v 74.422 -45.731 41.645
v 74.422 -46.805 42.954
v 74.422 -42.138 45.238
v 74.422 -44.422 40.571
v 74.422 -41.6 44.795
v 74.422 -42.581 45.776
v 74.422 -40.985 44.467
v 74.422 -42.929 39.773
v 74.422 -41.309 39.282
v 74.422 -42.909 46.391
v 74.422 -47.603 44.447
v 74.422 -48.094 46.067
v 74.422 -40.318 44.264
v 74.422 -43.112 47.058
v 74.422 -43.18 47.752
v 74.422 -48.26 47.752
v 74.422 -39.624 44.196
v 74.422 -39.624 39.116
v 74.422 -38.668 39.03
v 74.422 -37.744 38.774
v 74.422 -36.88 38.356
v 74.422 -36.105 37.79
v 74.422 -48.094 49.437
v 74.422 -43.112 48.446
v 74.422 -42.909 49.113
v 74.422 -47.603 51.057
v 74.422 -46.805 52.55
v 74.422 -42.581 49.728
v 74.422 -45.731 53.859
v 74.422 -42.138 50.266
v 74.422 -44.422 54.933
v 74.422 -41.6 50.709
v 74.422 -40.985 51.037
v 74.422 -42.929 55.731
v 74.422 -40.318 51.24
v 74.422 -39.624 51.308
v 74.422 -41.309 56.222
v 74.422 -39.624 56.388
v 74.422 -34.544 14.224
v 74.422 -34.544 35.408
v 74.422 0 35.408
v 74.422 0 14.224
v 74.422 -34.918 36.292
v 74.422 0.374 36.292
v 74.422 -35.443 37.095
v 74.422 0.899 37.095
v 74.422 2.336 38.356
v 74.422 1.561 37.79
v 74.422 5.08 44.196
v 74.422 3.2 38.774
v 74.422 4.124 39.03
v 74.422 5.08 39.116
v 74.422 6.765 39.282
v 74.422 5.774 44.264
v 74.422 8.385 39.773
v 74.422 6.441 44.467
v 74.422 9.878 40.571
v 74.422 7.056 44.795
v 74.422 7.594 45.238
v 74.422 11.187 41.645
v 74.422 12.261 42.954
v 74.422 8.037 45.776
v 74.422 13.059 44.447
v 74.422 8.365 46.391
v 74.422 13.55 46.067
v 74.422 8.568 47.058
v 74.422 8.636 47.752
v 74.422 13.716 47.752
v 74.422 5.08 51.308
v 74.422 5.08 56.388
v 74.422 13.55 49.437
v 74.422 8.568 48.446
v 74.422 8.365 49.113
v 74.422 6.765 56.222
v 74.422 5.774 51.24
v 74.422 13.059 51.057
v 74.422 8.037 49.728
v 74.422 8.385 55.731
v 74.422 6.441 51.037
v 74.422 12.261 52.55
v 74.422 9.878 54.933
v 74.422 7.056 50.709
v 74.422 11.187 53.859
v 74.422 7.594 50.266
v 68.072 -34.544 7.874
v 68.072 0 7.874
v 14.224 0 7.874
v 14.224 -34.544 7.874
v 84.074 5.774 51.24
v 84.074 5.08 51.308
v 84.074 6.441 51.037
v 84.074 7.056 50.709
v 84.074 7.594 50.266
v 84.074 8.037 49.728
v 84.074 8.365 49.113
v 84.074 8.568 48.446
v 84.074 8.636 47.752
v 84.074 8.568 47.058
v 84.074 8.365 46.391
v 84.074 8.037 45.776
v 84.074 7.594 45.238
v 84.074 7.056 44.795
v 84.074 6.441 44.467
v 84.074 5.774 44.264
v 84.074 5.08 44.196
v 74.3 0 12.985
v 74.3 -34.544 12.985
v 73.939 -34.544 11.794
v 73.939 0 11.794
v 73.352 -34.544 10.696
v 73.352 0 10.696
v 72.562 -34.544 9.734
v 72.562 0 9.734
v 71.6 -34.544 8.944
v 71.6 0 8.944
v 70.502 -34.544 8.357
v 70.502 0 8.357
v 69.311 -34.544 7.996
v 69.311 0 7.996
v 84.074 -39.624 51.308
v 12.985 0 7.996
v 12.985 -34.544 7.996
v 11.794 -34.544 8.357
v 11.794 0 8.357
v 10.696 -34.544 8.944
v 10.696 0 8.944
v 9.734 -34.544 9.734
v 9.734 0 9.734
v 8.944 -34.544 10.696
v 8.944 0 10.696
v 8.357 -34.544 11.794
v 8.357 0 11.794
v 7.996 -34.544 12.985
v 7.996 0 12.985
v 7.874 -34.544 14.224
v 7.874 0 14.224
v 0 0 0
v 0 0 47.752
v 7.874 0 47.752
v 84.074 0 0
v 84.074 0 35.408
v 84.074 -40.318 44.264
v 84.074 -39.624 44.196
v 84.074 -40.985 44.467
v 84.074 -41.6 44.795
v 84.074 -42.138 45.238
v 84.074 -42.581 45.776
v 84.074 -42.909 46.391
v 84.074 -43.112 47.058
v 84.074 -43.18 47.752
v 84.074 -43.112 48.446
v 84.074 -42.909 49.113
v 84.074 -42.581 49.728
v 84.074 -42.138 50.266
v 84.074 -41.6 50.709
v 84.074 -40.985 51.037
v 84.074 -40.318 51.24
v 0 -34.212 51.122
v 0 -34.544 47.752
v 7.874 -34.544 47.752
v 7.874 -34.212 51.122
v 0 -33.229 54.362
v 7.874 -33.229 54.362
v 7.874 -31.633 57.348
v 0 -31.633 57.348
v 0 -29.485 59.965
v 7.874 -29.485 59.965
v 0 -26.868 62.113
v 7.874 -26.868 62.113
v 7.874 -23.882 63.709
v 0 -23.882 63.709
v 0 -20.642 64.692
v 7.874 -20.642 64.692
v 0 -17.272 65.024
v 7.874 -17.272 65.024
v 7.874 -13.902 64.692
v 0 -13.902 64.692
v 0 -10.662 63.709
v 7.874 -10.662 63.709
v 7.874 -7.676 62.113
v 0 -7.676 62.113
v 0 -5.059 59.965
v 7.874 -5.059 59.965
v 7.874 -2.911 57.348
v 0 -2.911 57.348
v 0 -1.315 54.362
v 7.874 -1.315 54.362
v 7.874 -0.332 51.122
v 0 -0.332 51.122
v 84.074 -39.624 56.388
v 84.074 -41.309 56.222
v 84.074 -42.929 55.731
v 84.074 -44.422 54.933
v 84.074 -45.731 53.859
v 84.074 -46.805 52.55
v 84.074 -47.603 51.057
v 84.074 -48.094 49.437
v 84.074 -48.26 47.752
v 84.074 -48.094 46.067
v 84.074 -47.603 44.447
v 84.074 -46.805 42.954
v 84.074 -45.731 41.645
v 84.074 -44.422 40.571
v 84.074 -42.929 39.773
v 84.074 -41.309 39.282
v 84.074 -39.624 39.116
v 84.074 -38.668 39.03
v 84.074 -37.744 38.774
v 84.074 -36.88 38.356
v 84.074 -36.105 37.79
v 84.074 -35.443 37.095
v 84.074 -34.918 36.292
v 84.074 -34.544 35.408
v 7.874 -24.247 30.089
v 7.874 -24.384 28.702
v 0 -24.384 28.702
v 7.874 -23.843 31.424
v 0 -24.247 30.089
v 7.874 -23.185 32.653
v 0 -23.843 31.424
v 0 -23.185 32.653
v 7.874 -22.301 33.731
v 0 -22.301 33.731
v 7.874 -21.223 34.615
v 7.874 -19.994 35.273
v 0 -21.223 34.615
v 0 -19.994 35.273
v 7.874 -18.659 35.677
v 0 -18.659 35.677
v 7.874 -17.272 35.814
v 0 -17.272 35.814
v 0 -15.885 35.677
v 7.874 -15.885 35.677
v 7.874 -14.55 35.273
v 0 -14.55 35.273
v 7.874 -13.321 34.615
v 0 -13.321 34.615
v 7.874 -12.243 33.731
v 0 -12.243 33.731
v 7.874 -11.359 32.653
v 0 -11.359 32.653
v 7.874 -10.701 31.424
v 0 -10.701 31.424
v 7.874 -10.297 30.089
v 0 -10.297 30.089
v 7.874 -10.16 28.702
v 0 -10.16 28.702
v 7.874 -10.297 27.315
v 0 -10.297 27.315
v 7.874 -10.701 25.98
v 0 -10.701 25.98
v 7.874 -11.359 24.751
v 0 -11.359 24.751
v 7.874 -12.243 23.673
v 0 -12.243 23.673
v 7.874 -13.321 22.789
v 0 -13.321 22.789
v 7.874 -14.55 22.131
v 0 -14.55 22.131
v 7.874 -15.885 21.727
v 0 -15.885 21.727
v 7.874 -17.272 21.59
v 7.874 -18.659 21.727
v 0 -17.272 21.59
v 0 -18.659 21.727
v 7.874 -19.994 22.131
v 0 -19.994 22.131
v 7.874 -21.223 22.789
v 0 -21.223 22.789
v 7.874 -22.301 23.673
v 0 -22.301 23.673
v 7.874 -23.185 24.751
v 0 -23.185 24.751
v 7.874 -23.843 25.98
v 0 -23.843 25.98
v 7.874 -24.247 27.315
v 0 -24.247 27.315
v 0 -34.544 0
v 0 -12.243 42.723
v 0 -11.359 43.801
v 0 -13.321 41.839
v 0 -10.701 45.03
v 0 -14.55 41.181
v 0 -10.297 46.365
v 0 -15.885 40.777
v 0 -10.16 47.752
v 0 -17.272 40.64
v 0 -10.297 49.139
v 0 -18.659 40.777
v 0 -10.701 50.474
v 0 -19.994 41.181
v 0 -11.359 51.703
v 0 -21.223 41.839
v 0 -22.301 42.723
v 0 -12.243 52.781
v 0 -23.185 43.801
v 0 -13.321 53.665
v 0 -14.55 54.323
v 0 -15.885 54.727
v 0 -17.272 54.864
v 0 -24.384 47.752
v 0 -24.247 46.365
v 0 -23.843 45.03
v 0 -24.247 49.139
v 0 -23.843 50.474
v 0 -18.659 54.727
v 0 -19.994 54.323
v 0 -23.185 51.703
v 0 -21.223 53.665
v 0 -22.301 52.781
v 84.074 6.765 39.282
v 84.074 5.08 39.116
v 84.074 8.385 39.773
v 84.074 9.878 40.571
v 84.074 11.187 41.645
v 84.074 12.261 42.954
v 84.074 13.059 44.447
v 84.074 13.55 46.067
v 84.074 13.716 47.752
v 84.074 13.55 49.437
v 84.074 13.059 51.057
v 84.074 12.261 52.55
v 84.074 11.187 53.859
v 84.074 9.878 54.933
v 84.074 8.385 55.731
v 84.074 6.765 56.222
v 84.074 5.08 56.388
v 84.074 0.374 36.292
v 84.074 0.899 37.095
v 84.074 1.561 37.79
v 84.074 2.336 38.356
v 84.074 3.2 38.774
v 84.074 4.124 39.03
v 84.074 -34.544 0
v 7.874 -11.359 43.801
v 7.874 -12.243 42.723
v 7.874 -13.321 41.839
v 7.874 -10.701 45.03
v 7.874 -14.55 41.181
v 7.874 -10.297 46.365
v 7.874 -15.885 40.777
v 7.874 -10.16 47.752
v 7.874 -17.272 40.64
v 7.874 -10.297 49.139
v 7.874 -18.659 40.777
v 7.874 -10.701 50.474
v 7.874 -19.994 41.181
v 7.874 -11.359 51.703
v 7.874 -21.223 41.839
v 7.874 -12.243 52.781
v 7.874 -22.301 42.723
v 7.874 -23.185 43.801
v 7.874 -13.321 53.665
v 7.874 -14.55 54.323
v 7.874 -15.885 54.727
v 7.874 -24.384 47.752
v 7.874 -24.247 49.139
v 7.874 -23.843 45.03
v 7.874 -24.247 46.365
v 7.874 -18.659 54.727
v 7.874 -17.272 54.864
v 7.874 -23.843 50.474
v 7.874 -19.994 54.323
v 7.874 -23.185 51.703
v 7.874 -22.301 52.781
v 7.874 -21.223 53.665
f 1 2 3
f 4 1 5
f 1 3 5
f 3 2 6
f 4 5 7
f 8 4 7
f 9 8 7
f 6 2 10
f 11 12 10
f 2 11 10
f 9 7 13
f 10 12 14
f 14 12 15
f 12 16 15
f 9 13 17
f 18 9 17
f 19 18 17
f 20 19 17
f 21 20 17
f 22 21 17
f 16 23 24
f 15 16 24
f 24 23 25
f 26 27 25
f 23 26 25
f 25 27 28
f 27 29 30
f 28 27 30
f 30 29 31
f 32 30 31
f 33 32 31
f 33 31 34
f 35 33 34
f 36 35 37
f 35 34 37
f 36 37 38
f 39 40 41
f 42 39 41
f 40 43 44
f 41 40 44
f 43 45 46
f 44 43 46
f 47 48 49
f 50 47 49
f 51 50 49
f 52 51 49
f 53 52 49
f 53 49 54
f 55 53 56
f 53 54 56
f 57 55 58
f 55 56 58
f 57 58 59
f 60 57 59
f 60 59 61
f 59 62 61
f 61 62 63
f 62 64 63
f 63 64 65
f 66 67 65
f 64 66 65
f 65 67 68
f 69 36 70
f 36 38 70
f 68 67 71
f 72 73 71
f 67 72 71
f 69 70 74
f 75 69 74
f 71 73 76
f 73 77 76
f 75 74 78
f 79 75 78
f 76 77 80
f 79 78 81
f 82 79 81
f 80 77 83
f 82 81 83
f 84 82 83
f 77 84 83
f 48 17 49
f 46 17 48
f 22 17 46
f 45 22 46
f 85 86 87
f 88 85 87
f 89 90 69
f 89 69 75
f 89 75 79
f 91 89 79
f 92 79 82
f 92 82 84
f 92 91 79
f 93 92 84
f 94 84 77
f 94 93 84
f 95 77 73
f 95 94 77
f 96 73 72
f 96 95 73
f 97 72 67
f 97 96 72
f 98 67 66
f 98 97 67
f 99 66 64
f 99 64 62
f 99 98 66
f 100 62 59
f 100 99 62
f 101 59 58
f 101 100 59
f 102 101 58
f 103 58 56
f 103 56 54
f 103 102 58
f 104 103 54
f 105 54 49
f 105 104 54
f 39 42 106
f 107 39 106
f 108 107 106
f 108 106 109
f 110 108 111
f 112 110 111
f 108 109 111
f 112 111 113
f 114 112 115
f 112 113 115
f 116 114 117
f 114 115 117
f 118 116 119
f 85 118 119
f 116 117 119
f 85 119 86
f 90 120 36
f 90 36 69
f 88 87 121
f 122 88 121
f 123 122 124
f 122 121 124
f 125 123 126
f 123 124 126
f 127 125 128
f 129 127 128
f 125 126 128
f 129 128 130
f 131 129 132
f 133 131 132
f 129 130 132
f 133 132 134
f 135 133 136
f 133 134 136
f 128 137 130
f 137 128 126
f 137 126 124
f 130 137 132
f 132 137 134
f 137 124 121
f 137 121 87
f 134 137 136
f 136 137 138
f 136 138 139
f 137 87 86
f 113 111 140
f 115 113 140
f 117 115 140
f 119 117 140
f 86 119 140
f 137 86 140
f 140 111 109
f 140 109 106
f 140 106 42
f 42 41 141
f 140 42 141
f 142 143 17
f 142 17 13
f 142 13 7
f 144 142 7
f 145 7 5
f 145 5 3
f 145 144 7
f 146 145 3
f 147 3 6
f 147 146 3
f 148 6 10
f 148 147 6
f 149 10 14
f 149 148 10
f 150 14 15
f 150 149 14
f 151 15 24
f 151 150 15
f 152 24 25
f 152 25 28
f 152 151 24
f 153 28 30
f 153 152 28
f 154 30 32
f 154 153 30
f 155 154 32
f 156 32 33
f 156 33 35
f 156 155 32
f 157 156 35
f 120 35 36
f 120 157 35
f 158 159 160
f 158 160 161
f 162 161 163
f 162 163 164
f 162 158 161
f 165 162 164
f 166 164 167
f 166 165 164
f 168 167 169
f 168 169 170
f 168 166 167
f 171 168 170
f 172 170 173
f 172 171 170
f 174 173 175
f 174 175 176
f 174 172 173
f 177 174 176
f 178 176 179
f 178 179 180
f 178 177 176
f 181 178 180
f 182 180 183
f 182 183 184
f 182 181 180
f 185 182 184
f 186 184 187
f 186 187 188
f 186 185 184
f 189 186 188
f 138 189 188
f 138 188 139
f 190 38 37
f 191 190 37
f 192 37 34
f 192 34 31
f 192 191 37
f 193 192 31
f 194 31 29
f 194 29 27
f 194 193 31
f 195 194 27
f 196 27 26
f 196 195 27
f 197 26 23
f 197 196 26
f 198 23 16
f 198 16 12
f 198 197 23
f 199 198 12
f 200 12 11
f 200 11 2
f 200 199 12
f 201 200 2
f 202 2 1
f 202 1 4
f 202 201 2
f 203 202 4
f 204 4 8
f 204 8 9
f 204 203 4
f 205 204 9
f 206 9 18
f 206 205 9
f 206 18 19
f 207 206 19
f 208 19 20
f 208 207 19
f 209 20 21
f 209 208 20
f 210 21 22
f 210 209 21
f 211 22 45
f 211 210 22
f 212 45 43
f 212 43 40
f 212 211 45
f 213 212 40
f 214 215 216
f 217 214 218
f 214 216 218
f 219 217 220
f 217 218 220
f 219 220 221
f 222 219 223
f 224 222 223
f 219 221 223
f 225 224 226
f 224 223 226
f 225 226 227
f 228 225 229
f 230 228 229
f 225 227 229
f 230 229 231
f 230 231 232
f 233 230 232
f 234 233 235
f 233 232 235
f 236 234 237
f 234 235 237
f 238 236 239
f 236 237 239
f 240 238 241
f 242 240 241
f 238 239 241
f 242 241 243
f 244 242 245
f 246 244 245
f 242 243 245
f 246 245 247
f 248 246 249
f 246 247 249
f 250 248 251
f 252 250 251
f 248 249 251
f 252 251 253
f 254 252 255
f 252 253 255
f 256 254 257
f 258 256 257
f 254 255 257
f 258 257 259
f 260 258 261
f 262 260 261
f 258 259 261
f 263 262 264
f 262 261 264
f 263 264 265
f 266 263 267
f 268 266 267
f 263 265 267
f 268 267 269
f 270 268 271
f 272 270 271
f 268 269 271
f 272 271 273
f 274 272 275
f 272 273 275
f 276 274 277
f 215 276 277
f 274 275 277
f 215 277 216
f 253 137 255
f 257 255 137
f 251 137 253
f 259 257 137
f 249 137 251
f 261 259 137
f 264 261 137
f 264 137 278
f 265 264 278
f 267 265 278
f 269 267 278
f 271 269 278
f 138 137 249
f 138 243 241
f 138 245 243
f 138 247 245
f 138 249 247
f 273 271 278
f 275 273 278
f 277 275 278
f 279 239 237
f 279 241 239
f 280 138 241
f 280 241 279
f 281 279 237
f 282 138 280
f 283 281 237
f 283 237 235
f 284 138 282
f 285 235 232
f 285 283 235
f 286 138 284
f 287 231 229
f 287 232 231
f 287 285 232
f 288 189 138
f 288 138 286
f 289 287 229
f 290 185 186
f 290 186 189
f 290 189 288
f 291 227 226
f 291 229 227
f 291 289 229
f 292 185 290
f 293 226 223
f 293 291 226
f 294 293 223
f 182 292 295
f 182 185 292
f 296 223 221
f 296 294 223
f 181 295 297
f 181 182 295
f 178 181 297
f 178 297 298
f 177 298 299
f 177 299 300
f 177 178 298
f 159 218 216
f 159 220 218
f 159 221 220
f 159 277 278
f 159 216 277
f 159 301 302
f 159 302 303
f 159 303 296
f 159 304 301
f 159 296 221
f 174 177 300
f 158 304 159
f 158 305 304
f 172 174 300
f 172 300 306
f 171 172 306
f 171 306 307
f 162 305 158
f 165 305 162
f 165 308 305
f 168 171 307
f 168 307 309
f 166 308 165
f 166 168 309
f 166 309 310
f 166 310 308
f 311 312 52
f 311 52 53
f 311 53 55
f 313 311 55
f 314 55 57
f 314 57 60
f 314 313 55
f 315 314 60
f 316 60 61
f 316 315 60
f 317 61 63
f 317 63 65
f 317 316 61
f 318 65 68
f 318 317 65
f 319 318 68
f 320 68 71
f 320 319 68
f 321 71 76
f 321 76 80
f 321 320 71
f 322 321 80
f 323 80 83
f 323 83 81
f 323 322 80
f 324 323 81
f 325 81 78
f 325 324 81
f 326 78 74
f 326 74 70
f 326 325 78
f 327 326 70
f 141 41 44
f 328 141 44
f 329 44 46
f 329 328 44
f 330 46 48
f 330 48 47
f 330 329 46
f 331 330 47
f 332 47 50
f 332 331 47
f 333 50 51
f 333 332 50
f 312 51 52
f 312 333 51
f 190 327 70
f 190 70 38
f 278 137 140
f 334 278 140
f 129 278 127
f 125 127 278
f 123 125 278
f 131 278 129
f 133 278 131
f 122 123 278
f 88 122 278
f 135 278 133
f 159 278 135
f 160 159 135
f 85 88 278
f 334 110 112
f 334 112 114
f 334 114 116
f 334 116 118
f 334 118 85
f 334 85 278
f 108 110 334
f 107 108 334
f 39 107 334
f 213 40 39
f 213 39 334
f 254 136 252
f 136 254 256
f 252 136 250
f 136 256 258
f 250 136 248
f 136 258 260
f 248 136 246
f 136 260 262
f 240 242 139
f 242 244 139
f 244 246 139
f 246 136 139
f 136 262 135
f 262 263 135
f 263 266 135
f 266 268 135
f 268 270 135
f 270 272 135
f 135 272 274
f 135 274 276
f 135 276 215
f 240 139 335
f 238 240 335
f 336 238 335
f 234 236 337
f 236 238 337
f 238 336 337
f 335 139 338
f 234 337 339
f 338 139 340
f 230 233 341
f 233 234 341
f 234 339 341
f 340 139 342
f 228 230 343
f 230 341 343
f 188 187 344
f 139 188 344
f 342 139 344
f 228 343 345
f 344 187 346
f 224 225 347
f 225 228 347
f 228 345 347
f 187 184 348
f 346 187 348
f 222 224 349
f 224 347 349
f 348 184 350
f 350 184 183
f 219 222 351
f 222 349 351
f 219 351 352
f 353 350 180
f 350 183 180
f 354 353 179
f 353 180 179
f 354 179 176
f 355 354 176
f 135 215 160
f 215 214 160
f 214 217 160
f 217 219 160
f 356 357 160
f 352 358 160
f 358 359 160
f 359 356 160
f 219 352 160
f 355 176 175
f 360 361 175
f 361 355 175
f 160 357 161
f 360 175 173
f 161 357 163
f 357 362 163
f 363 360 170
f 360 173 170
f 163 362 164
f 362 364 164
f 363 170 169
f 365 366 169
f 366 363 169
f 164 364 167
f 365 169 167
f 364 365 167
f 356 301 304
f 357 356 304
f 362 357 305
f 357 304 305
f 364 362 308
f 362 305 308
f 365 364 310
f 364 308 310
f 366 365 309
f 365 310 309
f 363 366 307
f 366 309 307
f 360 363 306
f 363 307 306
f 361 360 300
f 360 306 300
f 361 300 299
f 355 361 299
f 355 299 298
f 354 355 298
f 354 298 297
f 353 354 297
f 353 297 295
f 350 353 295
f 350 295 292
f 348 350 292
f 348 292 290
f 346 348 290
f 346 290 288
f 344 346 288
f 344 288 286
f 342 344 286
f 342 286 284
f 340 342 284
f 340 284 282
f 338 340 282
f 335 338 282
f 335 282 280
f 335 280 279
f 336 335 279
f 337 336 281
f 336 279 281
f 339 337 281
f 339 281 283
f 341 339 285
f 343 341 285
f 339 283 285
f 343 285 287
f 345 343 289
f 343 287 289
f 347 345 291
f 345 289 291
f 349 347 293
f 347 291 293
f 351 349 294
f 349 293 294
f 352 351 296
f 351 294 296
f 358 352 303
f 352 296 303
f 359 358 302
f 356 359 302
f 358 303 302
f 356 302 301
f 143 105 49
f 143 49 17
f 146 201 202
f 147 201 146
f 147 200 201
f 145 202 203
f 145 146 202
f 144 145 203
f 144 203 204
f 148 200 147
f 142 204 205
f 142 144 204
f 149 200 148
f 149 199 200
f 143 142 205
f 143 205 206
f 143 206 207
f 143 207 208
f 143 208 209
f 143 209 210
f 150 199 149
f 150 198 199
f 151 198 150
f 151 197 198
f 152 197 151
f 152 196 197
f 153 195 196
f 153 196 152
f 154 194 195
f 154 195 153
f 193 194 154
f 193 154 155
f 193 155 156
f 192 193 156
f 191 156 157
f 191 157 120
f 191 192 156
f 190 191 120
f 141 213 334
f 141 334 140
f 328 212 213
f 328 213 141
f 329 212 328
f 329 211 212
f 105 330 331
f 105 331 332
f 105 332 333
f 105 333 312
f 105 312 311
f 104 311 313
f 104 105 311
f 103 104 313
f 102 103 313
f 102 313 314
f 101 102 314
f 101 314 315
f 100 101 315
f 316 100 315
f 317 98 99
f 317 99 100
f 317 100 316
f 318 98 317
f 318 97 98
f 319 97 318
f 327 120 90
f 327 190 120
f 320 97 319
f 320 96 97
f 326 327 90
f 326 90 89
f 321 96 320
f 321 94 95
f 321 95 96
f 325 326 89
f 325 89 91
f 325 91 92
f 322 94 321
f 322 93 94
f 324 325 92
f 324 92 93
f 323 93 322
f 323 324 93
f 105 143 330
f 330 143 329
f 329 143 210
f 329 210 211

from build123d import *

# Parameters (mm, degrees)
F1_DEPTH = 34.544
F2_W     = 34.544
F2_H     = 3.556
F3_DEPTH = 9.652
F4_DEPTH = 9.652
F6_DEPTH = 7.874
F5_R     = 7.112
F7_DEPTH = 7.874


with BuildPart() as f1:
    # F0 (on Front) → F1 (new body)
    with BuildSketch(Plane.XZ):
        with BuildLine():
            Line((0, 47.752), (0, 0))
            Line((0, 0), (84.074, 0))
            Line((84.074, 0), (84.074, 47.752))
            Line((84.074, 47.752), (74.422, 47.752))
            Line((74.422, 47.752), (74.422, 14.224))
            ThreePointArc((74.422, 14.224), (72.562128, 9.733872), (68.072, 7.874))
            Line((68.072, 7.874), (14.224, 7.874))
            ThreePointArc((14.224, 7.874), (9.733872, 9.733872), (7.874, 14.224))
            Line((7.874, 14.224), (7.874, 47.752))
            Line((7.874, 47.752), (0, 47.752))
        make_face()
    extrude(amount=F1_DEPTH)

    # F2 (on face) → F3 (cut)
    with BuildSketch(Plane.YZ.offset(84.074)):
        with Locations((-17.272, 45.974)):
            Rectangle(F2_W, F2_H)
        with BuildLine():
            Line((-34.544, 44.196), (-39.624, 44.196))
            ThreePointArc((-39.624, 44.196), (-43.18, 47.752), (-39.624, 51.308))
            Line((-39.624, 51.308), (5.08, 51.308))
            ThreePointArc((5.08, 51.308), (8.636, 47.752), (5.08, 44.196))
            Line((5.08, 44.196), (0, 44.196))
            Line((0, 44.196), (0, 39.116))
            Line((0, 39.116), (5.08, 39.116))
            ThreePointArc((5.08, 39.116), (13.716, 47.752), (5.08, 56.388))
            Line((5.08, 56.388), (-39.624, 56.388))
            ThreePointArc((-39.624, 56.388), (-48.26, 47.752), (-39.624, 39.116))
            Line((-39.624, 39.116), (-34.544, 39.116))
            Line((-34.544, 39.116), (-34.544, 44.196))
        make_face()
    extrude(amount=-F3_DEPTH, mode=Mode.SUBTRACT)

    # F2 (on face) → F4 (join)
    with BuildSketch(Plane.YZ.offset(84.074)):
        with BuildLine():
            Line((-34.544, 44.196), (-39.624, 44.196))
            ThreePointArc((-39.624, 44.196), (-43.18, 47.752), (-39.624, 51.308))
            Line((-39.624, 51.308), (5.08, 51.308))
            ThreePointArc((5.08, 51.308), (8.636, 47.752), (5.08, 44.196))
            Line((5.08, 44.196), (0, 44.196))
            Line((0, 44.196), (0, 39.116))
            Line((0, 39.116), (5.08, 39.116))
            ThreePointArc((5.08, 39.116), (13.716, 47.752), (5.08, 56.388))
            Line((5.08, 56.388), (-39.624, 56.388))
            ThreePointArc((-39.624, 56.388), (-48.26, 47.752), (-39.624, 39.116))
            Line((-39.624, 39.116), (-34.544, 39.116))
            Line((-34.544, 39.116), (-34.544, 44.196))
        make_face()
        with BuildLine():
            Line((-34.544, 35.408394), (-34.544, 39.116))
            Line((-34.544, 39.116), (-39.624, 39.116))
            ThreePointArc((-39.624, 39.116), (-36.479451, 38.090523), (-34.544, 35.408394))
        make_face()
        with BuildLine():
            Line((5.08, 39.116), (0, 39.116))
            Line((0, 39.116), (0, 35.408394))
            ThreePointArc((0, 35.408394), (1.935451, 38.090523), (5.08, 39.116))
        make_face()
    extrude(amount=-F4_DEPTH)

    # F5 (on face) → F6 (join)
    with BuildSketch(Plane(origin=(0, 0, 0), x_dir=(0, -1, 0), z_dir=(-1, 0, 0))):
        with BuildLine():
            Line((24.384, 47.752), (34.544, 47.752))
            ThreePointArc((34.544, 47.752), (17.272, 65.024), (0, 47.752))
            Line((0, 47.752), (10.16, 47.752))
            ThreePointArc((10.16, 47.752), (17.272, 54.864), (24.384, 47.752))
        make_face()
    extrude(amount=-F6_DEPTH)

    # F5 (on face) → F7 (cut)
    with BuildSketch(Plane(origin=(0, 0, 0), x_dir=(0, -1, 0), z_dir=(-1, 0, 0))):
        with Locations((17.272, 47.752)):
            Circle(F5_R)
        with Locations((17.272, 28.702)):
            Circle(F5_R)
    extrude(amount=-F7_DEPTH, mode=Mode.SUBTRACT)


solid = f1.part
